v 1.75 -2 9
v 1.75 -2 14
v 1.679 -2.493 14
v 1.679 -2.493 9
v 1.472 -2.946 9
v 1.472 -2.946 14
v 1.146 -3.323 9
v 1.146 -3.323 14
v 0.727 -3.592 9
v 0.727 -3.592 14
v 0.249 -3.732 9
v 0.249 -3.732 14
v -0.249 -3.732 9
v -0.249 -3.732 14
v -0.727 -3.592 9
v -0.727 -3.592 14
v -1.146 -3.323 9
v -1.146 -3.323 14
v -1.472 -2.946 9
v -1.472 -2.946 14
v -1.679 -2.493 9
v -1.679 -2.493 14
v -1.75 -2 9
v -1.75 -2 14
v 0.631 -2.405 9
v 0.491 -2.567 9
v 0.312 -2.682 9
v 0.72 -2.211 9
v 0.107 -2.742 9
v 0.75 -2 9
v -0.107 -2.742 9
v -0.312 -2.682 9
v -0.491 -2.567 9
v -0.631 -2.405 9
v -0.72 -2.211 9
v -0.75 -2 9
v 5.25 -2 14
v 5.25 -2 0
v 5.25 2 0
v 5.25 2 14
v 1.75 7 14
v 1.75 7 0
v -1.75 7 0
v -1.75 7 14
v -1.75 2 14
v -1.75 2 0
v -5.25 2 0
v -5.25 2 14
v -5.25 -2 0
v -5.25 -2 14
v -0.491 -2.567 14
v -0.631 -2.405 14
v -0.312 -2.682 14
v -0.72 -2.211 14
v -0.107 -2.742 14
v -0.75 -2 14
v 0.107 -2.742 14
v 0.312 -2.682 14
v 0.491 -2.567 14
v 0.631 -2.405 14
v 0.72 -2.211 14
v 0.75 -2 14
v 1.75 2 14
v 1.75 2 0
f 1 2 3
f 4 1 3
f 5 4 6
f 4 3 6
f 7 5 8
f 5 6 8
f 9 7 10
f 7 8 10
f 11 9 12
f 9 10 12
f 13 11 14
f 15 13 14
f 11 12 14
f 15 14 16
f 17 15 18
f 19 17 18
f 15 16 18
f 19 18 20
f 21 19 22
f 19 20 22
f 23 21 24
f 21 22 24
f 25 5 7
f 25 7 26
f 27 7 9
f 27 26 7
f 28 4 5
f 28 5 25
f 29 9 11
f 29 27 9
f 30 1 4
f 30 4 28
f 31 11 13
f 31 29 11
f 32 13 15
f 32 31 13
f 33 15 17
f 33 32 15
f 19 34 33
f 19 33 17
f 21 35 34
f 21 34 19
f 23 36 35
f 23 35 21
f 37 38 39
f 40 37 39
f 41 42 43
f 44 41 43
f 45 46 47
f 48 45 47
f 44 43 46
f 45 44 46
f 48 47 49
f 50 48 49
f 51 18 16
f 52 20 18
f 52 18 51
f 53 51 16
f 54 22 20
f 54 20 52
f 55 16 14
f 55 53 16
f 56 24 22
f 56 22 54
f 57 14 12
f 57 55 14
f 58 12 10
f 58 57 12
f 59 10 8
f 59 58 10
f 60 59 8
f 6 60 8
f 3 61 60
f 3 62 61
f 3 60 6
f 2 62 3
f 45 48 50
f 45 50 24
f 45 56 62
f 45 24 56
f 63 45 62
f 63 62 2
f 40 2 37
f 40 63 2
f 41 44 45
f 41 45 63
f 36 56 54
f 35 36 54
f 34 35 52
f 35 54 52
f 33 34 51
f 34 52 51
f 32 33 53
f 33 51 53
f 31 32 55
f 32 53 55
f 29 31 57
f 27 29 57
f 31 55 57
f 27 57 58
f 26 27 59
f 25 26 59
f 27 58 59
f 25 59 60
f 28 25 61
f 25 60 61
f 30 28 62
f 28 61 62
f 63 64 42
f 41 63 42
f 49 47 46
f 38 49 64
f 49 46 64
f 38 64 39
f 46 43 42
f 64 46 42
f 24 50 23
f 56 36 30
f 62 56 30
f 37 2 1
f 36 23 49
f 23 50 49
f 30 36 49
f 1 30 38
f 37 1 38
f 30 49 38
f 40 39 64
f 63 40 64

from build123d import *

# Parameters (mm, degrees)
BOSS_EXTRUDE1_DEPTH = 14
BOSS_EXTRUDE2_DEPTH = 5


with BuildPart() as part:
    # Sketch1 → Boss-Extrude1 (new body)
    with BuildSketch(Plane.XY):
        Polygon((1.75, 2), (1.75, 7), (-1.75, 7), (-1.75, 2), (-5.25, 2), (-5.25, -2), (5.25, -2), (5.25, 2), align=None)
    extrude(amount=BOSS_EXTRUDE1_DEPTH)

    # Sketch2 → Boss-Extrude2 (add)
    with BuildSketch(Plane.XY.offset(14)):
        with BuildLine():
            Line((-1.75, -2), (-0.75, -2))
            ThreePointArc((-0.75, -2), (0, -2.75), (0.75, -2))
            Line((0.75, -2), (1.75, -2))
            ThreePointArc((1.75, -2), (0, -3.75), (-1.75, -2))
        make_face()
    extrude(amount=-BOSS_EXTRUDE2_DEPTH)


solid = part.part
